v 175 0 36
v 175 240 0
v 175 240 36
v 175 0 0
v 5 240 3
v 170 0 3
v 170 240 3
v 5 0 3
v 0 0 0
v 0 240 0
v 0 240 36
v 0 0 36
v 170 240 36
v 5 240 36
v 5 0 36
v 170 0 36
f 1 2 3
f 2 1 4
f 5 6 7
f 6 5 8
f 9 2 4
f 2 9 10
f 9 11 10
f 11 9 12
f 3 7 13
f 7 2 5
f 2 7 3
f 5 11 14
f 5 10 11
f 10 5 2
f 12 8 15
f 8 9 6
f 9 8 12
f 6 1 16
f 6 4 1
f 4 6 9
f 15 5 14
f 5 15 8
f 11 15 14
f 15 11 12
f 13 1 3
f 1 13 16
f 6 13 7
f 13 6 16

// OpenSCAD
armWidth = 175;
armLength = 240;
lipHeight = 0;
lipWidth = 0;
supportHeight = 33;
supportWidth = 5;
plateHeight = 3;

cube([armWidth, armLength, plateHeight]);

module support () {
    cube([supportWidth, armLength, plateHeight + supportHeight]);
}

support();

translate ([armWidth - supportWidth, 0, 0]) {
    support();
}

translate ([0, 0, -lipHeight]) {
    cube([armWidth, lipWidth, plateHeight + lipHeight]);
    cube([lipWidth, armLength, plateHeight + lipHeight]);
}

translate([0, armLength - lipWidth, -lipHeight]) {
    cube([armWidth, lipWidth, plateHeight + lipHeight]);
}

translate([armWidth - lipWidth, 0, -lipHeight]) {
    cube([lipWidth, armLength, plateHeight + lipHeight]);
}
